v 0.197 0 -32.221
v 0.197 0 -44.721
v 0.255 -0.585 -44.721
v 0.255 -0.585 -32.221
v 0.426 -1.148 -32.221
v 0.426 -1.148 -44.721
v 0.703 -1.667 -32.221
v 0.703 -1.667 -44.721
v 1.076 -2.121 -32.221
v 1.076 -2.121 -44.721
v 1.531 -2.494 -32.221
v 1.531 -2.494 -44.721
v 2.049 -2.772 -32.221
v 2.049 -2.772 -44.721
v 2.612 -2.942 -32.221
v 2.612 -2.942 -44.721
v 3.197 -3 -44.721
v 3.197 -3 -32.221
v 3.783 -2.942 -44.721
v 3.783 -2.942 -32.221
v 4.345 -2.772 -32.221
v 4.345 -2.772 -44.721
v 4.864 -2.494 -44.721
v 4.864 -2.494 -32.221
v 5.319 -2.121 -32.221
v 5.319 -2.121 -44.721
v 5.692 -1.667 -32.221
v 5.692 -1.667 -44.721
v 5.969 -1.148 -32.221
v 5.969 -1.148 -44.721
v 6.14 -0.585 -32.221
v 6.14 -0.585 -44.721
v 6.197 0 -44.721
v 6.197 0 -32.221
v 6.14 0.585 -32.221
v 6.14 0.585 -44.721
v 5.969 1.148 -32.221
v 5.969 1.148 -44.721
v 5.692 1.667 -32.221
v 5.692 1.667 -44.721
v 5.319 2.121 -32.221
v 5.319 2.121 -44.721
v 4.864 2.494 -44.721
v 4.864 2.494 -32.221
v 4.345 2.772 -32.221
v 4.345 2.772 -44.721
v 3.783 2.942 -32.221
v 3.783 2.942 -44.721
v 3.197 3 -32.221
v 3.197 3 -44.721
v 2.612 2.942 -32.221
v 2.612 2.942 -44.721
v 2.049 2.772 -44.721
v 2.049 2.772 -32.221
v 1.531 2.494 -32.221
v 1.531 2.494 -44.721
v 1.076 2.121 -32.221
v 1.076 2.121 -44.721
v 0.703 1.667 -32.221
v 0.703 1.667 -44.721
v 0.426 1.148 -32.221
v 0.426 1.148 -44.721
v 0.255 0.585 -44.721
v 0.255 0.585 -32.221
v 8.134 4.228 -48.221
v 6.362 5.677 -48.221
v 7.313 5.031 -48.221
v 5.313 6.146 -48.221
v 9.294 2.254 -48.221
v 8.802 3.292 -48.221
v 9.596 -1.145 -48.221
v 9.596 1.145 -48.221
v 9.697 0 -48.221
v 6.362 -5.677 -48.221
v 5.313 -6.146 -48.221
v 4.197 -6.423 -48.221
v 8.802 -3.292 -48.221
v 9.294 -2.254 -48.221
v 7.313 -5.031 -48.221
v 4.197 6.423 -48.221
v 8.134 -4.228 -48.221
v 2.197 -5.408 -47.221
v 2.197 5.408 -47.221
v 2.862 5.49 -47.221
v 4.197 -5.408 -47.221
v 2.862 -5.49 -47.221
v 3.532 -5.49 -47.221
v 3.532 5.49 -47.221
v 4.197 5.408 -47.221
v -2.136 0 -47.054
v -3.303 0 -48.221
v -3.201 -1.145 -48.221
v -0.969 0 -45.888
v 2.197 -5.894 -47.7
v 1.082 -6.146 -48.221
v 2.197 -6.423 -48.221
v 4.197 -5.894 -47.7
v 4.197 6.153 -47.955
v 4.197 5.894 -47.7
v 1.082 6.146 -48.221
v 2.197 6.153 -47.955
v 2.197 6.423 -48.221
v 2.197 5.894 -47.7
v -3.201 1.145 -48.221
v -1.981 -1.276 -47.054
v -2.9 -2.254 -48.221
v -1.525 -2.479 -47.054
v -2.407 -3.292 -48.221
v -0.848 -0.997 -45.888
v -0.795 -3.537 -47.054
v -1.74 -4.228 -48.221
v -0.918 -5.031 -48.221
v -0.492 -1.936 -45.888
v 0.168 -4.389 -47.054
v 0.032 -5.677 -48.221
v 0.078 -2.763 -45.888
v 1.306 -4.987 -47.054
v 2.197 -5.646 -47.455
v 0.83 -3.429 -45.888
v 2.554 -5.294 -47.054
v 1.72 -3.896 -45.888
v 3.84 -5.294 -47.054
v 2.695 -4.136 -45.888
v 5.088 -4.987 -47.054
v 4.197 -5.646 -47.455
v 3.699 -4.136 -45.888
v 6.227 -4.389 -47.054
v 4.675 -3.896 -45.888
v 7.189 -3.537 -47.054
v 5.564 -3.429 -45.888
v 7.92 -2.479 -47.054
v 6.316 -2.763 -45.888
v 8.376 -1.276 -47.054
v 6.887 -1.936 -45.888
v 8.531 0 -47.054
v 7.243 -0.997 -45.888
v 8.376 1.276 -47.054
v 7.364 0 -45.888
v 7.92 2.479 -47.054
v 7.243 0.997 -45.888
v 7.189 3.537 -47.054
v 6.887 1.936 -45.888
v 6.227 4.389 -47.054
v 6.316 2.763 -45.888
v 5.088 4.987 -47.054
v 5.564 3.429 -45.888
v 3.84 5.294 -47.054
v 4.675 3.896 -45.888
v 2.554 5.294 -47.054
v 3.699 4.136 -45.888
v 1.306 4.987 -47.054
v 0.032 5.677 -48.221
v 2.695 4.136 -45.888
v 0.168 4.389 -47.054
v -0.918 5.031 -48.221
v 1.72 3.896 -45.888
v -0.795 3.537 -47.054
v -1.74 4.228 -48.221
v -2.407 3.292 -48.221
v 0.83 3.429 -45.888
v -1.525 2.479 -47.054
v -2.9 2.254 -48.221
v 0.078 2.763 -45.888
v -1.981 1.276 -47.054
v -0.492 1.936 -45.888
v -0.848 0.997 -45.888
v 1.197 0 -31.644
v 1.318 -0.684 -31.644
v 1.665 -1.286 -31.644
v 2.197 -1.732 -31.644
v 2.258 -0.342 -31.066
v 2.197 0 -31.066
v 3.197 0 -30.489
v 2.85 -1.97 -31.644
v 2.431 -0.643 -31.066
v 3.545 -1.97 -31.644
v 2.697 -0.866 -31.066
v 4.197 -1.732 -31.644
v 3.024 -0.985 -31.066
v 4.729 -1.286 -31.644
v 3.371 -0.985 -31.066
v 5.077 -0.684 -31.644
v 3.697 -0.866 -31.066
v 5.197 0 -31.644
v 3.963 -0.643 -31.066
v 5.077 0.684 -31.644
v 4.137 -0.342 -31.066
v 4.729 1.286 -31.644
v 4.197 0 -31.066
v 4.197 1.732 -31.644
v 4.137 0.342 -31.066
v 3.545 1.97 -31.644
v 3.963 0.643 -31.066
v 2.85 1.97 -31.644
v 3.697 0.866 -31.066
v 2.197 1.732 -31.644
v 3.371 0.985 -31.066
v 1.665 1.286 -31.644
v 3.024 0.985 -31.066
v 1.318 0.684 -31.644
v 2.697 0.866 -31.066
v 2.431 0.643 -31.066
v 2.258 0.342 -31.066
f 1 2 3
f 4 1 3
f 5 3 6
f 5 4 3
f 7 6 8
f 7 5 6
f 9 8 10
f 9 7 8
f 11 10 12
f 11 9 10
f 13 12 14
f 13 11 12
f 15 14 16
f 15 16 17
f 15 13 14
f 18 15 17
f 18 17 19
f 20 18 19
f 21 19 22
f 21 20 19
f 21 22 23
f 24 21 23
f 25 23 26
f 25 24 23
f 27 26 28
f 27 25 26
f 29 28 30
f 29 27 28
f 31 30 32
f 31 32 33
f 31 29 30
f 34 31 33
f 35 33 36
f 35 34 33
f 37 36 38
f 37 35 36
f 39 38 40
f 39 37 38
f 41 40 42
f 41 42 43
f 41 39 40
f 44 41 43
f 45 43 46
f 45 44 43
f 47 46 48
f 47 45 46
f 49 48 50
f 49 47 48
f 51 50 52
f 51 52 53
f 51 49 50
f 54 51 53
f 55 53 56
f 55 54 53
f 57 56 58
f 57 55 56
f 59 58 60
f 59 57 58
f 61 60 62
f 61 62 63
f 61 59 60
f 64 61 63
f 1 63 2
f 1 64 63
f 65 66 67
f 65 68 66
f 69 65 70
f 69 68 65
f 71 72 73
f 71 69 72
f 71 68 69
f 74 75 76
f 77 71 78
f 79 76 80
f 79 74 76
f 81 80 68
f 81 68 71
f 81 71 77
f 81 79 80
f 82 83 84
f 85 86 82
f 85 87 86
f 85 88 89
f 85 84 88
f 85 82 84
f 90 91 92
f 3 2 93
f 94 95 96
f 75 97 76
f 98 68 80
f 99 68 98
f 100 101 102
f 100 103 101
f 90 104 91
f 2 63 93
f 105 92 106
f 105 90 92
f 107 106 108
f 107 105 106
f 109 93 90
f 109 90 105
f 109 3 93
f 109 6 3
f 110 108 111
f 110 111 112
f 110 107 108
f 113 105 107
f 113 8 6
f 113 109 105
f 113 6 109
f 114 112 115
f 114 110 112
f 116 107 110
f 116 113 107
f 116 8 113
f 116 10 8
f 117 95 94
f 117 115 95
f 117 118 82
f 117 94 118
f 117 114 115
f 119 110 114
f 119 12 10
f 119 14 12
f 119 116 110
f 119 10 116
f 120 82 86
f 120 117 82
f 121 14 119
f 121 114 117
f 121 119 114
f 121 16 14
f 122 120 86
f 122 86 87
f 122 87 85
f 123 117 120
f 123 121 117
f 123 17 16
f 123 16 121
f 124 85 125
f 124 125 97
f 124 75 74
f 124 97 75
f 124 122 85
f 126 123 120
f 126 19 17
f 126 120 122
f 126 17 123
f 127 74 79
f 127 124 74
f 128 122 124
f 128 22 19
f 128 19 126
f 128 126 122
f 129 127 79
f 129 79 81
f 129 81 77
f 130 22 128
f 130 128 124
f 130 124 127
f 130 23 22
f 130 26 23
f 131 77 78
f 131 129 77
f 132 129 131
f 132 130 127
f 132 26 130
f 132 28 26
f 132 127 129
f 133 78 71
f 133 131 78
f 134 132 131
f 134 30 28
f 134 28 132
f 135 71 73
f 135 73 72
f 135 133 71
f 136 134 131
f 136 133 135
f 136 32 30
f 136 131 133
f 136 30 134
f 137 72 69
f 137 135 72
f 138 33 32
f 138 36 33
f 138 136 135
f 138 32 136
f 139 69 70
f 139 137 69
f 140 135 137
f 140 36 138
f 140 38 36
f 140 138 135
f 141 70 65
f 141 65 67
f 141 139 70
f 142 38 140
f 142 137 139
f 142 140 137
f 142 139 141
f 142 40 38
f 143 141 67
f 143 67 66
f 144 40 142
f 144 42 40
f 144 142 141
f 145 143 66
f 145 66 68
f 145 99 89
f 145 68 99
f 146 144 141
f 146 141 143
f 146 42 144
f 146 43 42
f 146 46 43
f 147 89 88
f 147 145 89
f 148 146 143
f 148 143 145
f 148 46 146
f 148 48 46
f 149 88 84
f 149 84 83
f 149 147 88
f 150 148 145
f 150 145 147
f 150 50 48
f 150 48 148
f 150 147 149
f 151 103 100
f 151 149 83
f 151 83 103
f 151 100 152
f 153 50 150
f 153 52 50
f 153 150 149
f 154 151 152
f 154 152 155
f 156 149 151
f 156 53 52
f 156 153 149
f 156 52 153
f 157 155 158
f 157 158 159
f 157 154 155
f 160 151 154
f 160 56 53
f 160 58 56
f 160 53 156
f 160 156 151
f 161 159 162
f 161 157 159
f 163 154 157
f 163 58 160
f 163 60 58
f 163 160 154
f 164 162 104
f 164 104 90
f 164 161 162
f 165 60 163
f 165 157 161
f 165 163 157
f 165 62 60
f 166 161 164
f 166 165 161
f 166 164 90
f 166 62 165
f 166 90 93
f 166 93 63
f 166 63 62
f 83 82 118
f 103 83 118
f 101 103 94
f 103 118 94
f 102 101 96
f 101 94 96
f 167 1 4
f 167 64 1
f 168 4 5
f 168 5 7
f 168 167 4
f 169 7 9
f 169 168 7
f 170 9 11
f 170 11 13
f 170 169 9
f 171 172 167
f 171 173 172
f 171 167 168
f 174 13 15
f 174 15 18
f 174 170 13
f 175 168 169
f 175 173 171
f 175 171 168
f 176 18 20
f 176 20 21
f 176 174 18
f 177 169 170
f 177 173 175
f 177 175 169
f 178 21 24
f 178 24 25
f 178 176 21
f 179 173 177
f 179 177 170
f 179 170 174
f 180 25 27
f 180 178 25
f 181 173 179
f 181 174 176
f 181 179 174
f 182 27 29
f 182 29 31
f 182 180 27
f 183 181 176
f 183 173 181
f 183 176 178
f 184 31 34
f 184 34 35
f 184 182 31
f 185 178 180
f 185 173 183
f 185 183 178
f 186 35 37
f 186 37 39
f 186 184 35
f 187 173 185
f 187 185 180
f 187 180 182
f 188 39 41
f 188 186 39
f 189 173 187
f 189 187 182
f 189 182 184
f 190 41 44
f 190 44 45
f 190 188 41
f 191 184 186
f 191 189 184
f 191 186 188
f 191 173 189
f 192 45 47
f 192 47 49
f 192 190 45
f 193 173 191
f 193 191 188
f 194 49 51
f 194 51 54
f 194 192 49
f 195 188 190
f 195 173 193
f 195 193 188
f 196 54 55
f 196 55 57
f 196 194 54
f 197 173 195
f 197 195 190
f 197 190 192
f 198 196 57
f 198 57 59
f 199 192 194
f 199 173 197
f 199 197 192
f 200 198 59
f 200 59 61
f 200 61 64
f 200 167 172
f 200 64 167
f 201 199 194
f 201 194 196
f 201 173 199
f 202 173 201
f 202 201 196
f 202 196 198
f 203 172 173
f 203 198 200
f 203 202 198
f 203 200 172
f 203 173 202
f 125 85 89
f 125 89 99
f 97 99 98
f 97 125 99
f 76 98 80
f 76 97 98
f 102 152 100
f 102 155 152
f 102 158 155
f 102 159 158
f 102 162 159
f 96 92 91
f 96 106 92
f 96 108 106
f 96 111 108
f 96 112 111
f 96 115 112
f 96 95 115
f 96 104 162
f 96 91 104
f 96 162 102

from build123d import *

# Parameters (mm, degrees)
CUT_EXTRUDE1_DEPTH      = 50.614070771
CUT_EXTRUDE1_DEPTH_BACK = 12
SKETCH2_W               = 2
SKETCH2_H               = 1


with BuildPart() as part:
    # Sketch1 → Revolve1 (revolve)
    with BuildSketch(Plane(origin=(0, 0, 0), x_dir=(1, 0, 0), z_dir=(0, 1, 0)), mode=Mode.PRIVATE) as revolve1_sk:
        Polygon((9.697241479, 48.221048581), (6.197241479, 44.721048581), (6.197241479, 32.221048581), (3.197241479, 30.488997773), (3.197241479, 48.221048581), align=None)
    revolve(revolve1_sk.sketch.rotate(Axis((3.197241479, 0, -48.221048581), (0, 0, 1)), 180), axis=Axis((3.197241479, 0, -48.221048581), (0, 0, 1)))

    # Sketch2 → Cut-Extrude1 (cut, two sides: drawn at the far end of the back side and taken through both)
    with BuildSketch(Plane(origin=(0, 0, 0), x_dir=(1, 0, 0), z_dir=(0, 1, 0)).offset(-CUT_EXTRUDE1_DEPTH_BACK)):
        with Locations((3.197241479, 47.721048581)):
            Rectangle(SKETCH2_W, SKETCH2_H)
    extrude(amount=CUT_EXTRUDE1_DEPTH + CUT_EXTRUDE1_DEPTH_BACK, mode=Mode.SUBTRACT)


solid = part.part
